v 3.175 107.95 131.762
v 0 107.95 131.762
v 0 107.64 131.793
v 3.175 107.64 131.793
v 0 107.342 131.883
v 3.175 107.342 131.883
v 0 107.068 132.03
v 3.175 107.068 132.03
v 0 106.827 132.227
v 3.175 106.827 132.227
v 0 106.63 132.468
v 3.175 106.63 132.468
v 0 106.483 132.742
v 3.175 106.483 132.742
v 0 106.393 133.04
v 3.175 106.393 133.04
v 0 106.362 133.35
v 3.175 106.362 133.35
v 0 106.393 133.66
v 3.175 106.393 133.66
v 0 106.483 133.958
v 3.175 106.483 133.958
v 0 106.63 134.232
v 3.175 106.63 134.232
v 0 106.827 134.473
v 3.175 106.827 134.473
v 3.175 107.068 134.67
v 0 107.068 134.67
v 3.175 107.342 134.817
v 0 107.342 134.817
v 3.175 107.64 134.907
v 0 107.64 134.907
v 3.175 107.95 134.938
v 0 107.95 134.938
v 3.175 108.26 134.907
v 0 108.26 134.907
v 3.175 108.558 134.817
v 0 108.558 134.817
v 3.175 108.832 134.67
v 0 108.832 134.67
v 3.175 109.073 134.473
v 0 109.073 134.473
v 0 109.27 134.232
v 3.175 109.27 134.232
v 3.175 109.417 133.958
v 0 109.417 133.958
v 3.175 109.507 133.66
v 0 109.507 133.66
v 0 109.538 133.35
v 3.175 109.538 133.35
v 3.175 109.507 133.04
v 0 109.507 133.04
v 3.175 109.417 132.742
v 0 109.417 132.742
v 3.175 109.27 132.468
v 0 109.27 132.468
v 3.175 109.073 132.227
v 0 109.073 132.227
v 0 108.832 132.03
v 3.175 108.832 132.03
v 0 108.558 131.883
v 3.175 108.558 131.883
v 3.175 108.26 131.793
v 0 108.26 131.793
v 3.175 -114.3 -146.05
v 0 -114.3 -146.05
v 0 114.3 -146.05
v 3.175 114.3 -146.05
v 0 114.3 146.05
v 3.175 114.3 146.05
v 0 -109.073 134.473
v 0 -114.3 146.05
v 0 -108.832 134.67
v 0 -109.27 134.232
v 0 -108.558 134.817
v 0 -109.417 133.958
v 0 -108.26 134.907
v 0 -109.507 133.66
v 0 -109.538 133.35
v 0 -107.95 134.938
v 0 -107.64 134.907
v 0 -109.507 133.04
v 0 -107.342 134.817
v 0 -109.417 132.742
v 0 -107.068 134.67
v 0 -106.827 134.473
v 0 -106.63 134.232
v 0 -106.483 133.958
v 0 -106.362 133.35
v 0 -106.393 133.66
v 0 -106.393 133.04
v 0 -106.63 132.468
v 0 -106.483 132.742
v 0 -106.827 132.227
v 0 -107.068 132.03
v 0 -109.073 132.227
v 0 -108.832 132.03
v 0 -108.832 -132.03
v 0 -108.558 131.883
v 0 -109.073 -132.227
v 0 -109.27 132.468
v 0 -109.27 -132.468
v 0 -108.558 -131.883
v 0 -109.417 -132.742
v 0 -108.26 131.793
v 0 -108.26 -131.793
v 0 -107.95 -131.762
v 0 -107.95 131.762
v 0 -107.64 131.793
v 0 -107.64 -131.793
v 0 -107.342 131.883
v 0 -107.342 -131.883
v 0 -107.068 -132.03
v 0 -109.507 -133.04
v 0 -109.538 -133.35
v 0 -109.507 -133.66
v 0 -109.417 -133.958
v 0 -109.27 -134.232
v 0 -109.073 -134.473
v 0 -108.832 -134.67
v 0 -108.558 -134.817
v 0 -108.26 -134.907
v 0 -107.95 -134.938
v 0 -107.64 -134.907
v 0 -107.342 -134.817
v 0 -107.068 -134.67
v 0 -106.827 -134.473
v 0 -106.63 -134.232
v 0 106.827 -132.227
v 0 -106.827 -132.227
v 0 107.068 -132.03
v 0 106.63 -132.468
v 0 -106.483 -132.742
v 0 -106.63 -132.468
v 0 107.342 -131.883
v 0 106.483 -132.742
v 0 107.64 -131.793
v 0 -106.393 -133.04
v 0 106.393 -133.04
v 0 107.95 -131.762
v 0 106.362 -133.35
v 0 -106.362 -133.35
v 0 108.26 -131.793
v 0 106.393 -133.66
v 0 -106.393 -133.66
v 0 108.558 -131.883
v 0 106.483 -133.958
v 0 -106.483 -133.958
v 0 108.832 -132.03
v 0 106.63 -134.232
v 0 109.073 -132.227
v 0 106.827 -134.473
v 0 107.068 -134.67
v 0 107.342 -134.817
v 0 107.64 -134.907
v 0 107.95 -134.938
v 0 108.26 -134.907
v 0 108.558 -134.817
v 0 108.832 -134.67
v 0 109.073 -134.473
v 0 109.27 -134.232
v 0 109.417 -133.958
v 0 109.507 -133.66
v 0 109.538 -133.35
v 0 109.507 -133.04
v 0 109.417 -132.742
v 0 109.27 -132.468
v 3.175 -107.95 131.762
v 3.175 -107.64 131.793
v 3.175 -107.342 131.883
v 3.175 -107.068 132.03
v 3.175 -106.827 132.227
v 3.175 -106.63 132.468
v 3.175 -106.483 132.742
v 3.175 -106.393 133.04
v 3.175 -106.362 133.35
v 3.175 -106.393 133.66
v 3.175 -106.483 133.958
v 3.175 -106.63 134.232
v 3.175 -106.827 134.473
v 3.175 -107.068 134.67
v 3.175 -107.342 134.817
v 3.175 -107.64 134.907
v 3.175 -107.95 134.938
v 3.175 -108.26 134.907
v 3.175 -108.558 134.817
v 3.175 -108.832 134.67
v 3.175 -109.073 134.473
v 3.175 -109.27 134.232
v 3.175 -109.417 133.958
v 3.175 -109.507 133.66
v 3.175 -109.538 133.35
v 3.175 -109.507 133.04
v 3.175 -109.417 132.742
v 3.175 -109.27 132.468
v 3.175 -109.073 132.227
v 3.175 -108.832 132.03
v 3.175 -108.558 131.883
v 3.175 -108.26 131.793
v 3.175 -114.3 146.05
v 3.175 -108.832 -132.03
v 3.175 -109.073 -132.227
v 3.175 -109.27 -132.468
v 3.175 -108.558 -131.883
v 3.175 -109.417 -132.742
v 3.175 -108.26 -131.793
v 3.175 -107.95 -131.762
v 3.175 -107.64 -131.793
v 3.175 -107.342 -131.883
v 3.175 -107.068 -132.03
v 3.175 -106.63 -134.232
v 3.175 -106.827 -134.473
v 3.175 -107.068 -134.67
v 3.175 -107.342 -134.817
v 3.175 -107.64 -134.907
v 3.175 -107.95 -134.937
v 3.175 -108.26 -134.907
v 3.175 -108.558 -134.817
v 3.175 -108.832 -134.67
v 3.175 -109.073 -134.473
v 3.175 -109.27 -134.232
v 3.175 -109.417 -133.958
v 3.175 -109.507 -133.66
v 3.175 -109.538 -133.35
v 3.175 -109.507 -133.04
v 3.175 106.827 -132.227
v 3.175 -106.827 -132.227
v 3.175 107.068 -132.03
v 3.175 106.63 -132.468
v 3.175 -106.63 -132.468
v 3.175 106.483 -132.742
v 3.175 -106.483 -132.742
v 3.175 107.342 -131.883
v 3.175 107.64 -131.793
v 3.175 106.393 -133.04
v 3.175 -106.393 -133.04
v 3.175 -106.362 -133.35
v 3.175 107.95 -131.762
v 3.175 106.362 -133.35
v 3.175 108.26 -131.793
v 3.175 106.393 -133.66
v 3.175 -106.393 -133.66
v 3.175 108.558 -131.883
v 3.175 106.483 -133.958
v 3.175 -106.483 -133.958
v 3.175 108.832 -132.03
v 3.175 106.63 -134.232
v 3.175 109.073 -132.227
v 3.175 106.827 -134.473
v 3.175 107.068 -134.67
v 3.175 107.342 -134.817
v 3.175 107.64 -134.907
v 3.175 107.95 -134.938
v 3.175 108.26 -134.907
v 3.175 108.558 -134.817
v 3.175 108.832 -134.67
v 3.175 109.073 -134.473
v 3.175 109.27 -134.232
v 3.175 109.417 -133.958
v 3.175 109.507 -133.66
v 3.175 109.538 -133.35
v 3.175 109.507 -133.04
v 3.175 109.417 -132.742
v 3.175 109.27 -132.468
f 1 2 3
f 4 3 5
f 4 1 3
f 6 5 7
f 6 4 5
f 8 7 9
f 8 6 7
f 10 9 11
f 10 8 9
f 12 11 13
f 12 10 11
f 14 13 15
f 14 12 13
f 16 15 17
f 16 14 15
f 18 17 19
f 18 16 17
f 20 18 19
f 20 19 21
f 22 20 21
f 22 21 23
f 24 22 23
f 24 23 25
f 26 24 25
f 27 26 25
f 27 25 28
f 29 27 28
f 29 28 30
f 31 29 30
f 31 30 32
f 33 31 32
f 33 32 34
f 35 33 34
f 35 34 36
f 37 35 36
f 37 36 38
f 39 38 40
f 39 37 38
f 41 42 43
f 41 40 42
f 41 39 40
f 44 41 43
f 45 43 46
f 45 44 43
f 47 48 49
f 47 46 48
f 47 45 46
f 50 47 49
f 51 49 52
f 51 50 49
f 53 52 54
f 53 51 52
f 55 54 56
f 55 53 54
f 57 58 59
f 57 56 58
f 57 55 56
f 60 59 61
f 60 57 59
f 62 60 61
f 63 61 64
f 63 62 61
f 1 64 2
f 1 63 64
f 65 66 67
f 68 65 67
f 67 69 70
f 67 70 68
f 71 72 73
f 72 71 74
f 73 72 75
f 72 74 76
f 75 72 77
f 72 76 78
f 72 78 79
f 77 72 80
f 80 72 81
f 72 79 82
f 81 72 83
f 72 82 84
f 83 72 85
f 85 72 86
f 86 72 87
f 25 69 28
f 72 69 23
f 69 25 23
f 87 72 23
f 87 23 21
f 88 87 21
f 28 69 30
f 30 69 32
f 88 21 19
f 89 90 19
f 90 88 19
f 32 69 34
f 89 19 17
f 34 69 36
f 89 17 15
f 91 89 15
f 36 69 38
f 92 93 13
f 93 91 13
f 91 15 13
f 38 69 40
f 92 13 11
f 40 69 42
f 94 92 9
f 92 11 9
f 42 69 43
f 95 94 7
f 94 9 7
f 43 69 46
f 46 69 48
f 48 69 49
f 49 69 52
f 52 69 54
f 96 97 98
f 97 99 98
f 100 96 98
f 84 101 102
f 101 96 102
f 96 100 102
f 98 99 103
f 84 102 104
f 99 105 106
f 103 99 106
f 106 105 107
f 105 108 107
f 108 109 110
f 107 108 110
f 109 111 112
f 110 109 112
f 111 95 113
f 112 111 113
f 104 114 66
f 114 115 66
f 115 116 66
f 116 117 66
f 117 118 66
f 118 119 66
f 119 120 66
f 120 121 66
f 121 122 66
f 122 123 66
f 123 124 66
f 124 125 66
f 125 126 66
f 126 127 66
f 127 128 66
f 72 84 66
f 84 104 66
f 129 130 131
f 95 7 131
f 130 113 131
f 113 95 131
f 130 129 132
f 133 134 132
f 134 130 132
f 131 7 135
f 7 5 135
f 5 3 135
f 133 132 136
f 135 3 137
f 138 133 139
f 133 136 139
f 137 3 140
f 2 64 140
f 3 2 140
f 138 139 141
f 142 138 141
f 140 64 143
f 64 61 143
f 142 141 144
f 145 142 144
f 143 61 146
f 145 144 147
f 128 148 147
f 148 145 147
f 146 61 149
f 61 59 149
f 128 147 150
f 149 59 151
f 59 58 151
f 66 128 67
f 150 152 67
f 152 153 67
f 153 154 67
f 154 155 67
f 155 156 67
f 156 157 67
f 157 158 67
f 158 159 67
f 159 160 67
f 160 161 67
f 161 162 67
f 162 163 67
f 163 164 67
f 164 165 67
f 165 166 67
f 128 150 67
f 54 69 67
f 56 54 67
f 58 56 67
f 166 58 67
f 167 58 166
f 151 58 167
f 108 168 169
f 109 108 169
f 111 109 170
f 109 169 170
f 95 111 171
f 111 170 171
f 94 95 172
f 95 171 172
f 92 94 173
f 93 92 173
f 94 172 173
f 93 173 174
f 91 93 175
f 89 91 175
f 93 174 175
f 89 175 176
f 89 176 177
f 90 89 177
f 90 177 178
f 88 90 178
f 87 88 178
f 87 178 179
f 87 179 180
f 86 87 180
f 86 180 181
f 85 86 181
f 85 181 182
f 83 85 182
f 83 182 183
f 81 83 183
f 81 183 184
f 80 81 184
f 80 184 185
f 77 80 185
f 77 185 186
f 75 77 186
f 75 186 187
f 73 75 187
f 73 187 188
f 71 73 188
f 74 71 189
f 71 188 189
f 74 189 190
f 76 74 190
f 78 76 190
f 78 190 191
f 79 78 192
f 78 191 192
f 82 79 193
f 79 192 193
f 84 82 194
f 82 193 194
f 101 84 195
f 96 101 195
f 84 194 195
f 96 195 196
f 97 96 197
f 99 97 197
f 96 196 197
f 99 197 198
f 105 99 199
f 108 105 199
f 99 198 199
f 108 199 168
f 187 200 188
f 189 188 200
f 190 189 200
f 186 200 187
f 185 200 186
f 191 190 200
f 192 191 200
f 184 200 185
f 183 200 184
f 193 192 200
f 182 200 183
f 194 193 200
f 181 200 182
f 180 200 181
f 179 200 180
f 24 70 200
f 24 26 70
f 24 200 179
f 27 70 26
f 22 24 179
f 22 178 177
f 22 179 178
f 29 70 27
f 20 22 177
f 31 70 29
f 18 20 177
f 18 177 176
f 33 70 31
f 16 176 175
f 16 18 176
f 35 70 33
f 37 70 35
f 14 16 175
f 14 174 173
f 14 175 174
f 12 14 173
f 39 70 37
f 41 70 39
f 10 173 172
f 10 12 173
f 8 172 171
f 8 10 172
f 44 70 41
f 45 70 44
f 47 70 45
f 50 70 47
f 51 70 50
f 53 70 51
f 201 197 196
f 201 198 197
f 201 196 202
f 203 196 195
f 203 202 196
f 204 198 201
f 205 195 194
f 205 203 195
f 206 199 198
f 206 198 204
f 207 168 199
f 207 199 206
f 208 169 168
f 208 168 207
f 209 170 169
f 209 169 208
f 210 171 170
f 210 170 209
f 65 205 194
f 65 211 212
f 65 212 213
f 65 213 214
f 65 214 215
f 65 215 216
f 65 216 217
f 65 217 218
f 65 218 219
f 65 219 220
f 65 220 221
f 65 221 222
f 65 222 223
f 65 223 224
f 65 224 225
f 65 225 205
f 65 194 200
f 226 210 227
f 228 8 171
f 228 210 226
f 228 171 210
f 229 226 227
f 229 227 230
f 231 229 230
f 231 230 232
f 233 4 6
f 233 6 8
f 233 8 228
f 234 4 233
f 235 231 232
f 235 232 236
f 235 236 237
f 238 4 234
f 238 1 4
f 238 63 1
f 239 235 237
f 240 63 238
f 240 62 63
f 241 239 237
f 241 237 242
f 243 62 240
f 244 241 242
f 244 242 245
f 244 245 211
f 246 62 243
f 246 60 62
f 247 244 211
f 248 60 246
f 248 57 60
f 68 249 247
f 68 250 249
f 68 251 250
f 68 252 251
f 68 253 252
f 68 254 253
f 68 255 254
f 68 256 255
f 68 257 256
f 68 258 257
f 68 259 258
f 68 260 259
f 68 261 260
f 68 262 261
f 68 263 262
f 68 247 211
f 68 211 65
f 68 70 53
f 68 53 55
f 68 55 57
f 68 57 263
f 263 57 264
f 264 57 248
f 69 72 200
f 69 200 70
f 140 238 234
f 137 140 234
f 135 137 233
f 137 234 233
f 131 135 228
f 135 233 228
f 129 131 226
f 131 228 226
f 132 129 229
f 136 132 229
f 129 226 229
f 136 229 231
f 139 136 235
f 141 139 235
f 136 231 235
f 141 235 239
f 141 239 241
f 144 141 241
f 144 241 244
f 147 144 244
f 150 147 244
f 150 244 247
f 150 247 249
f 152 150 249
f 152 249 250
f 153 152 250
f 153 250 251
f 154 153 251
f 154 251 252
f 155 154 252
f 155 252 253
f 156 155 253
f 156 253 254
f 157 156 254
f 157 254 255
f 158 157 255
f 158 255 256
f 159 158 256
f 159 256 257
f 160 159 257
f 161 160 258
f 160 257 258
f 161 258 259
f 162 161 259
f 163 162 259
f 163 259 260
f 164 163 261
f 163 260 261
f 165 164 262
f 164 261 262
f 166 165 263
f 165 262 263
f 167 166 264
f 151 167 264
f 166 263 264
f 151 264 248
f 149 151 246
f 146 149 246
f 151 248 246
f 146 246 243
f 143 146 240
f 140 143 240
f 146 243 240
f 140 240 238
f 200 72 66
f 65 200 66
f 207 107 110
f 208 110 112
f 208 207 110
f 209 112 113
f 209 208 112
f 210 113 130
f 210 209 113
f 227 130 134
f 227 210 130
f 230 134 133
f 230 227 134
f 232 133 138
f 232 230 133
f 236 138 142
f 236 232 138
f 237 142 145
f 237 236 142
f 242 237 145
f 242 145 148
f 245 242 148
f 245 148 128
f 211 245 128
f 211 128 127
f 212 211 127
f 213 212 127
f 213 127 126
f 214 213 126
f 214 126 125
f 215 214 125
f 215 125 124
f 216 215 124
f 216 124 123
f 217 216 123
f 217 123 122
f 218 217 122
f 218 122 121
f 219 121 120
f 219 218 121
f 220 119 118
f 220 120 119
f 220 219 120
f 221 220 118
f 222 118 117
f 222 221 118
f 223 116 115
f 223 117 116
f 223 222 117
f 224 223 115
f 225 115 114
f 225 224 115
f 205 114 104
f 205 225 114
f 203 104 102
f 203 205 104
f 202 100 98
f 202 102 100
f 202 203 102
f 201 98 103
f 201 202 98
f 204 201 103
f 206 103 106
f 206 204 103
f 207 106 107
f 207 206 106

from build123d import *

# Parameters (mm, degrees)
SKETCH2_W               = 292.1
SKETCH2_H               = 228.6
BOSS_EXTRUDE1_DEPTH     = 3.175
SKETCH3_R               = 1.5875
CUT_EXTRUDE1_DEPTH      = 186.486315196
MIRROR2_COPY_1_SKETCH_R = 1.5875
MIRROR2_COPY_1_DEPTH    = 186.486315196


with BuildPart() as part:
    # Sketch2 → Boss-Extrude1 (new body)
    with BuildSketch(Plane(origin=(0, 0, 0), x_dir=(0, 0, -1), z_dir=(1, 0, 0))):
        Rectangle(SKETCH2_W, SKETCH2_H)
    extrude(amount=BOSS_EXTRUDE1_DEPTH)

    # Sketch3 → Cut-Extrude1 (cut, through all)
    with BuildSketch(Plane(origin=(3.175, 0, 0), x_dir=(0, 0, -1), z_dir=(1, 0, 0))):
        with Locations((-133.35, -107.95)):
            Circle(SKETCH3_R)
    cut_extrude1 = extrude(amount=-CUT_EXTRUDE1_DEPTH, mode=Mode.SUBTRACT)

    # Mirror1: Cut-Extrude1 across plane
    add(cut_extrude1.mirror(Plane.ZX), mode=Mode.SUBTRACT)

    # Mirror2: Cut-Extrude1 across plane
    add(cut_extrude1.mirror(Plane.XY), mode=Mode.SUBTRACT)

    # Mirror2 copy 1 sketch → Mirror2 copy 1 (cut, through all)
    with BuildSketch(Plane(origin=(3.175, 0, 0), x_dir=(0, 0, 1), z_dir=(1, 0, 0))):
        with Locations((-133.35, -107.95)):
            Circle(MIRROR2_COPY_1_SKETCH_R)
    extrude(amount=-MIRROR2_COPY_1_DEPTH, mode=Mode.SUBTRACT)


solid = part.part
